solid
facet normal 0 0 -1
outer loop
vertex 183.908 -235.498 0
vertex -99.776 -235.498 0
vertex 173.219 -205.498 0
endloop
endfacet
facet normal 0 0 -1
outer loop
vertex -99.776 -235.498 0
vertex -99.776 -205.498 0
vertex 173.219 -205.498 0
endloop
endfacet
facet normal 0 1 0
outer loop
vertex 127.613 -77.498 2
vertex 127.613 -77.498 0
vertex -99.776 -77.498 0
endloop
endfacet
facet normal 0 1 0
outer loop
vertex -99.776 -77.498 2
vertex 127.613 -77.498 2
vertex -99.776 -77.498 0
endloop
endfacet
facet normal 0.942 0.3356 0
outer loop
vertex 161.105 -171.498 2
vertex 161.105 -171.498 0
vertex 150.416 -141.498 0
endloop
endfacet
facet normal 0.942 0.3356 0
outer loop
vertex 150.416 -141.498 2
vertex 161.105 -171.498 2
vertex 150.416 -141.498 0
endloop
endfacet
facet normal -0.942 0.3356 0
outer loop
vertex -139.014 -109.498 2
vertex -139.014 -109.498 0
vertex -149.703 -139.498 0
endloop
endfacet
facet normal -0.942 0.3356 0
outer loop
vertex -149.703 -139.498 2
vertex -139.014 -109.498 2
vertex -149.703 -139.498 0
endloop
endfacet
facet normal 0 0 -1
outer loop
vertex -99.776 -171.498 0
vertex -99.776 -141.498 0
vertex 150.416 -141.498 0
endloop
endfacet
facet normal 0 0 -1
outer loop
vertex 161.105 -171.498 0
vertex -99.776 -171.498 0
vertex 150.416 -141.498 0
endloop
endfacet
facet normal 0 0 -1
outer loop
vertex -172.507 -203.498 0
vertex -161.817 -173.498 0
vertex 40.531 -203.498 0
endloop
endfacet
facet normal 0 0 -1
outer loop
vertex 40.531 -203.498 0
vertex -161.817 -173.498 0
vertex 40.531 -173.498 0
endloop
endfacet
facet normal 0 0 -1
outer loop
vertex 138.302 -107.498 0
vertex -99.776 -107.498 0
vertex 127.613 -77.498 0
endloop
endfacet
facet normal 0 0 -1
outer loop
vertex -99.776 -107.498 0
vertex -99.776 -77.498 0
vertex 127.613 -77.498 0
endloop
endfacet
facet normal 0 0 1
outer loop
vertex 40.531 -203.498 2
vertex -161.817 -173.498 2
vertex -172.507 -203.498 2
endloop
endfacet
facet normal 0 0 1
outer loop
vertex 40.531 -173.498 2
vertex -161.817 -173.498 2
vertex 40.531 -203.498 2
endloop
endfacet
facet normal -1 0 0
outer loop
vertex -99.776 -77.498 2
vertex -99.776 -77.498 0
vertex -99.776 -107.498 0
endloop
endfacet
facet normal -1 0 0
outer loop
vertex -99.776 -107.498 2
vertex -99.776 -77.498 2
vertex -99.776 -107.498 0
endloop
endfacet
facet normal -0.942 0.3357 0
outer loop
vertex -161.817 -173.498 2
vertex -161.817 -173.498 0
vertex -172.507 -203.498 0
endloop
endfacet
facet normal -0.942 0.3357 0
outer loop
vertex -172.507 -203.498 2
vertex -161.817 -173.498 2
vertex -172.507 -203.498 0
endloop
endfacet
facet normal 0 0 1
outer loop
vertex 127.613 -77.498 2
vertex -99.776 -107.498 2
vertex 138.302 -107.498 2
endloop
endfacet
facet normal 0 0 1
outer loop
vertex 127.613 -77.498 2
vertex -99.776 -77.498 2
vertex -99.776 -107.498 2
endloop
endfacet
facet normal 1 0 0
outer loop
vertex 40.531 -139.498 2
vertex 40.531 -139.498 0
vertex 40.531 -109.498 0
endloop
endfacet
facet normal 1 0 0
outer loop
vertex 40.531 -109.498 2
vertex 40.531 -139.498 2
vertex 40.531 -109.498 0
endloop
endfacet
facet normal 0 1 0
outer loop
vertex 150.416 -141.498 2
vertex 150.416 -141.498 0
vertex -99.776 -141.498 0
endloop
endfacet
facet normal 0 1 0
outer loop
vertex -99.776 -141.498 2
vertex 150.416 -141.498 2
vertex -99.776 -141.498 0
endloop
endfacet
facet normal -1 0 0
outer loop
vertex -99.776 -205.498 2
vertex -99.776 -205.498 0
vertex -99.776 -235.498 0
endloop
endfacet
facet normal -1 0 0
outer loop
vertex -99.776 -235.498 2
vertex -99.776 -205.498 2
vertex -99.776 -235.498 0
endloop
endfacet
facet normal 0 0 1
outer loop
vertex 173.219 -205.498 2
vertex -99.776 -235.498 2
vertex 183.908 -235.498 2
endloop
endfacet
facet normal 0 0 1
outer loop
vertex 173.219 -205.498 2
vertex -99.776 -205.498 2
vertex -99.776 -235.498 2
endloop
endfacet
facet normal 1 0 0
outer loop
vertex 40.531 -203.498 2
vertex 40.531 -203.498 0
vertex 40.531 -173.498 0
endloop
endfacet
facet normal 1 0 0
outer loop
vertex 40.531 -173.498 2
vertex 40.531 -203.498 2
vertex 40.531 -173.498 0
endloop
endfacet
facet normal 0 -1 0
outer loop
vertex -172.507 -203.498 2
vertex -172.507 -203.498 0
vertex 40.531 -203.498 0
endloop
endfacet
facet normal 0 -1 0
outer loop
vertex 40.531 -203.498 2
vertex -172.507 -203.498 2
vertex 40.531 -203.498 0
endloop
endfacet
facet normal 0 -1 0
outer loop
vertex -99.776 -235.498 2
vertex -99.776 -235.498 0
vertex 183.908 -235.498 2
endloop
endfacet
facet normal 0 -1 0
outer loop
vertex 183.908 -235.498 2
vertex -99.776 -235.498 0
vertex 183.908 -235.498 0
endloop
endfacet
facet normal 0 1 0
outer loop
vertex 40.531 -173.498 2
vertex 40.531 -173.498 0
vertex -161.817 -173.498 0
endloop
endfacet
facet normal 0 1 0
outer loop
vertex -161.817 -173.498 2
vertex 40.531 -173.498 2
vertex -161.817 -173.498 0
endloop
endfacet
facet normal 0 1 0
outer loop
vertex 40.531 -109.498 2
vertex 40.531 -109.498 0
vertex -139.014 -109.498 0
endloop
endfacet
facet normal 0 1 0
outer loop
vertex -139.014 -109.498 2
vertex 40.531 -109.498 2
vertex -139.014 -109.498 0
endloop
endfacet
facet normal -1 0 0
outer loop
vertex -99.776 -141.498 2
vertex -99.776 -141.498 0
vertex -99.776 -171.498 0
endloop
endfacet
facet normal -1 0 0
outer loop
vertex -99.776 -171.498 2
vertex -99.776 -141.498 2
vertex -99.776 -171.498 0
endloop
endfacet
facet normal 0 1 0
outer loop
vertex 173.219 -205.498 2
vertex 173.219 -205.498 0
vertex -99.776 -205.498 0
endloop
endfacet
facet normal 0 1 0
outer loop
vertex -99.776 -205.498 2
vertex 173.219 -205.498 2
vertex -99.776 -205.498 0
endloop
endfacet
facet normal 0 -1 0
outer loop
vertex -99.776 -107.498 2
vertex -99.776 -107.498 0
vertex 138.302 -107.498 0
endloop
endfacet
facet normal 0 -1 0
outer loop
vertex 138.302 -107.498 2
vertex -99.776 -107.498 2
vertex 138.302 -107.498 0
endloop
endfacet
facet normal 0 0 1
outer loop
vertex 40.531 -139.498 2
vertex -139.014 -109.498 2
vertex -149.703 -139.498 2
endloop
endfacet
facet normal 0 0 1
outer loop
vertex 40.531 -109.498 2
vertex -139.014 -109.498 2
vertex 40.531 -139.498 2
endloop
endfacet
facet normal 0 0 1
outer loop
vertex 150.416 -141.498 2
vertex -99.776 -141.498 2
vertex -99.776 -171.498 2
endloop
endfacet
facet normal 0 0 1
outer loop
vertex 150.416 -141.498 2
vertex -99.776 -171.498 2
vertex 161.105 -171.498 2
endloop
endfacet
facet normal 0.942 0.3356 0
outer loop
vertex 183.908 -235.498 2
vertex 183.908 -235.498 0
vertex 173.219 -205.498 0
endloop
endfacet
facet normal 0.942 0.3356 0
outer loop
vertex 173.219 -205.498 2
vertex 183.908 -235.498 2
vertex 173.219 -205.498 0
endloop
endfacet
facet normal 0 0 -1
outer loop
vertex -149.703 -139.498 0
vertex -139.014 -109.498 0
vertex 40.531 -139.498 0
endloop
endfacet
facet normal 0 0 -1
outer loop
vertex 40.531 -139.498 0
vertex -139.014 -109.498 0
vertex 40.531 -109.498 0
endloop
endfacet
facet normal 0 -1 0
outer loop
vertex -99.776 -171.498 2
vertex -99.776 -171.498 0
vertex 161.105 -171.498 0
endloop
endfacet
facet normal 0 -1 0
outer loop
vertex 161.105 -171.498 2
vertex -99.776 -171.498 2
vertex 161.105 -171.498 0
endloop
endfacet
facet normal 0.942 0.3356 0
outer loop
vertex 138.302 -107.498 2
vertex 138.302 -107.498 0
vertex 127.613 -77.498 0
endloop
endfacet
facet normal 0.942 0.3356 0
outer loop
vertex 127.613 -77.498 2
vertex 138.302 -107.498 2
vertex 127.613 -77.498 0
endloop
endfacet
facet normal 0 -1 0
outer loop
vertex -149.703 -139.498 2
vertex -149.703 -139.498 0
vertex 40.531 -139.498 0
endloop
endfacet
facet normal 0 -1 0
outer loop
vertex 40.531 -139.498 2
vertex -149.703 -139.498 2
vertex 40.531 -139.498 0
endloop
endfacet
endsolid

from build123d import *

# Parameters (mm, degrees)
F3_DEPTH = 2


# Not quite as in the source:
# - the program builds the solid bodies; features that only make, move or delete a surface that nothing else refers to are left out


with BuildPart() as f3:
    # F2 (on Top) → F3 (new body)
    with BuildSketch(Plane.XY):
        Polygon((-99.7756651271, -235.4982528798), (183.9081217199, -235.4982528798), (173.2191097174, -205.4982528798), (-99.7756651271, -205.4982528798), align=None)
    extrude(amount=F3_DEPTH)


with BuildPart() as f3b:
    # F2 (on Top) → F3, piece 2 (new body)
    with BuildSketch(Plane.XY):
        Polygon((-161.8174969148, -173.4982528798), (-172.5065089173, -203.4982528798), (40.5311334112, -203.4982528798), (40.5311334112, -173.4982528798), align=None)
    extrude(amount=F3_DEPTH)


with BuildPart() as f3c:
    # F2 (on Top) → F3, piece 3 (new body)
    with BuildSketch(Plane.XY):
        Polygon((-99.7756651271, -141.4982528798), (-99.7756651271, -171.4982528798), (161.1048961146, -171.4982528798), (150.4158841121, -141.4982528798), align=None)
    extrude(amount=F3_DEPTH)


with BuildPart() as f3d:
    # F2 (on Top) → F3, piece 4 (new body)
    with BuildSketch(Plane.XY):
        Polygon((-139.0142713095, -109.4982528798), (-149.703283312, -139.4982528798), (40.5311334112, -139.4982528798), (40.5311334112, -109.4982528798), align=None)
    extrude(amount=F3_DEPTH)


with BuildPart() as f3e:
    # F2 (on Top) → F3, piece 5 (new body)
    with BuildSketch(Plane.XY):
        Polygon((-99.7756651271, -107.4982528798), (138.3016705093, -107.4982528798), (127.6126585068, -77.4982528798), (-99.7756651271, -77.4982528798), align=None)
    extrude(amount=F3_DEPTH)


solid = Compound([f3.part, f3b.part, f3c.part, f3d.part, f3e.part])
